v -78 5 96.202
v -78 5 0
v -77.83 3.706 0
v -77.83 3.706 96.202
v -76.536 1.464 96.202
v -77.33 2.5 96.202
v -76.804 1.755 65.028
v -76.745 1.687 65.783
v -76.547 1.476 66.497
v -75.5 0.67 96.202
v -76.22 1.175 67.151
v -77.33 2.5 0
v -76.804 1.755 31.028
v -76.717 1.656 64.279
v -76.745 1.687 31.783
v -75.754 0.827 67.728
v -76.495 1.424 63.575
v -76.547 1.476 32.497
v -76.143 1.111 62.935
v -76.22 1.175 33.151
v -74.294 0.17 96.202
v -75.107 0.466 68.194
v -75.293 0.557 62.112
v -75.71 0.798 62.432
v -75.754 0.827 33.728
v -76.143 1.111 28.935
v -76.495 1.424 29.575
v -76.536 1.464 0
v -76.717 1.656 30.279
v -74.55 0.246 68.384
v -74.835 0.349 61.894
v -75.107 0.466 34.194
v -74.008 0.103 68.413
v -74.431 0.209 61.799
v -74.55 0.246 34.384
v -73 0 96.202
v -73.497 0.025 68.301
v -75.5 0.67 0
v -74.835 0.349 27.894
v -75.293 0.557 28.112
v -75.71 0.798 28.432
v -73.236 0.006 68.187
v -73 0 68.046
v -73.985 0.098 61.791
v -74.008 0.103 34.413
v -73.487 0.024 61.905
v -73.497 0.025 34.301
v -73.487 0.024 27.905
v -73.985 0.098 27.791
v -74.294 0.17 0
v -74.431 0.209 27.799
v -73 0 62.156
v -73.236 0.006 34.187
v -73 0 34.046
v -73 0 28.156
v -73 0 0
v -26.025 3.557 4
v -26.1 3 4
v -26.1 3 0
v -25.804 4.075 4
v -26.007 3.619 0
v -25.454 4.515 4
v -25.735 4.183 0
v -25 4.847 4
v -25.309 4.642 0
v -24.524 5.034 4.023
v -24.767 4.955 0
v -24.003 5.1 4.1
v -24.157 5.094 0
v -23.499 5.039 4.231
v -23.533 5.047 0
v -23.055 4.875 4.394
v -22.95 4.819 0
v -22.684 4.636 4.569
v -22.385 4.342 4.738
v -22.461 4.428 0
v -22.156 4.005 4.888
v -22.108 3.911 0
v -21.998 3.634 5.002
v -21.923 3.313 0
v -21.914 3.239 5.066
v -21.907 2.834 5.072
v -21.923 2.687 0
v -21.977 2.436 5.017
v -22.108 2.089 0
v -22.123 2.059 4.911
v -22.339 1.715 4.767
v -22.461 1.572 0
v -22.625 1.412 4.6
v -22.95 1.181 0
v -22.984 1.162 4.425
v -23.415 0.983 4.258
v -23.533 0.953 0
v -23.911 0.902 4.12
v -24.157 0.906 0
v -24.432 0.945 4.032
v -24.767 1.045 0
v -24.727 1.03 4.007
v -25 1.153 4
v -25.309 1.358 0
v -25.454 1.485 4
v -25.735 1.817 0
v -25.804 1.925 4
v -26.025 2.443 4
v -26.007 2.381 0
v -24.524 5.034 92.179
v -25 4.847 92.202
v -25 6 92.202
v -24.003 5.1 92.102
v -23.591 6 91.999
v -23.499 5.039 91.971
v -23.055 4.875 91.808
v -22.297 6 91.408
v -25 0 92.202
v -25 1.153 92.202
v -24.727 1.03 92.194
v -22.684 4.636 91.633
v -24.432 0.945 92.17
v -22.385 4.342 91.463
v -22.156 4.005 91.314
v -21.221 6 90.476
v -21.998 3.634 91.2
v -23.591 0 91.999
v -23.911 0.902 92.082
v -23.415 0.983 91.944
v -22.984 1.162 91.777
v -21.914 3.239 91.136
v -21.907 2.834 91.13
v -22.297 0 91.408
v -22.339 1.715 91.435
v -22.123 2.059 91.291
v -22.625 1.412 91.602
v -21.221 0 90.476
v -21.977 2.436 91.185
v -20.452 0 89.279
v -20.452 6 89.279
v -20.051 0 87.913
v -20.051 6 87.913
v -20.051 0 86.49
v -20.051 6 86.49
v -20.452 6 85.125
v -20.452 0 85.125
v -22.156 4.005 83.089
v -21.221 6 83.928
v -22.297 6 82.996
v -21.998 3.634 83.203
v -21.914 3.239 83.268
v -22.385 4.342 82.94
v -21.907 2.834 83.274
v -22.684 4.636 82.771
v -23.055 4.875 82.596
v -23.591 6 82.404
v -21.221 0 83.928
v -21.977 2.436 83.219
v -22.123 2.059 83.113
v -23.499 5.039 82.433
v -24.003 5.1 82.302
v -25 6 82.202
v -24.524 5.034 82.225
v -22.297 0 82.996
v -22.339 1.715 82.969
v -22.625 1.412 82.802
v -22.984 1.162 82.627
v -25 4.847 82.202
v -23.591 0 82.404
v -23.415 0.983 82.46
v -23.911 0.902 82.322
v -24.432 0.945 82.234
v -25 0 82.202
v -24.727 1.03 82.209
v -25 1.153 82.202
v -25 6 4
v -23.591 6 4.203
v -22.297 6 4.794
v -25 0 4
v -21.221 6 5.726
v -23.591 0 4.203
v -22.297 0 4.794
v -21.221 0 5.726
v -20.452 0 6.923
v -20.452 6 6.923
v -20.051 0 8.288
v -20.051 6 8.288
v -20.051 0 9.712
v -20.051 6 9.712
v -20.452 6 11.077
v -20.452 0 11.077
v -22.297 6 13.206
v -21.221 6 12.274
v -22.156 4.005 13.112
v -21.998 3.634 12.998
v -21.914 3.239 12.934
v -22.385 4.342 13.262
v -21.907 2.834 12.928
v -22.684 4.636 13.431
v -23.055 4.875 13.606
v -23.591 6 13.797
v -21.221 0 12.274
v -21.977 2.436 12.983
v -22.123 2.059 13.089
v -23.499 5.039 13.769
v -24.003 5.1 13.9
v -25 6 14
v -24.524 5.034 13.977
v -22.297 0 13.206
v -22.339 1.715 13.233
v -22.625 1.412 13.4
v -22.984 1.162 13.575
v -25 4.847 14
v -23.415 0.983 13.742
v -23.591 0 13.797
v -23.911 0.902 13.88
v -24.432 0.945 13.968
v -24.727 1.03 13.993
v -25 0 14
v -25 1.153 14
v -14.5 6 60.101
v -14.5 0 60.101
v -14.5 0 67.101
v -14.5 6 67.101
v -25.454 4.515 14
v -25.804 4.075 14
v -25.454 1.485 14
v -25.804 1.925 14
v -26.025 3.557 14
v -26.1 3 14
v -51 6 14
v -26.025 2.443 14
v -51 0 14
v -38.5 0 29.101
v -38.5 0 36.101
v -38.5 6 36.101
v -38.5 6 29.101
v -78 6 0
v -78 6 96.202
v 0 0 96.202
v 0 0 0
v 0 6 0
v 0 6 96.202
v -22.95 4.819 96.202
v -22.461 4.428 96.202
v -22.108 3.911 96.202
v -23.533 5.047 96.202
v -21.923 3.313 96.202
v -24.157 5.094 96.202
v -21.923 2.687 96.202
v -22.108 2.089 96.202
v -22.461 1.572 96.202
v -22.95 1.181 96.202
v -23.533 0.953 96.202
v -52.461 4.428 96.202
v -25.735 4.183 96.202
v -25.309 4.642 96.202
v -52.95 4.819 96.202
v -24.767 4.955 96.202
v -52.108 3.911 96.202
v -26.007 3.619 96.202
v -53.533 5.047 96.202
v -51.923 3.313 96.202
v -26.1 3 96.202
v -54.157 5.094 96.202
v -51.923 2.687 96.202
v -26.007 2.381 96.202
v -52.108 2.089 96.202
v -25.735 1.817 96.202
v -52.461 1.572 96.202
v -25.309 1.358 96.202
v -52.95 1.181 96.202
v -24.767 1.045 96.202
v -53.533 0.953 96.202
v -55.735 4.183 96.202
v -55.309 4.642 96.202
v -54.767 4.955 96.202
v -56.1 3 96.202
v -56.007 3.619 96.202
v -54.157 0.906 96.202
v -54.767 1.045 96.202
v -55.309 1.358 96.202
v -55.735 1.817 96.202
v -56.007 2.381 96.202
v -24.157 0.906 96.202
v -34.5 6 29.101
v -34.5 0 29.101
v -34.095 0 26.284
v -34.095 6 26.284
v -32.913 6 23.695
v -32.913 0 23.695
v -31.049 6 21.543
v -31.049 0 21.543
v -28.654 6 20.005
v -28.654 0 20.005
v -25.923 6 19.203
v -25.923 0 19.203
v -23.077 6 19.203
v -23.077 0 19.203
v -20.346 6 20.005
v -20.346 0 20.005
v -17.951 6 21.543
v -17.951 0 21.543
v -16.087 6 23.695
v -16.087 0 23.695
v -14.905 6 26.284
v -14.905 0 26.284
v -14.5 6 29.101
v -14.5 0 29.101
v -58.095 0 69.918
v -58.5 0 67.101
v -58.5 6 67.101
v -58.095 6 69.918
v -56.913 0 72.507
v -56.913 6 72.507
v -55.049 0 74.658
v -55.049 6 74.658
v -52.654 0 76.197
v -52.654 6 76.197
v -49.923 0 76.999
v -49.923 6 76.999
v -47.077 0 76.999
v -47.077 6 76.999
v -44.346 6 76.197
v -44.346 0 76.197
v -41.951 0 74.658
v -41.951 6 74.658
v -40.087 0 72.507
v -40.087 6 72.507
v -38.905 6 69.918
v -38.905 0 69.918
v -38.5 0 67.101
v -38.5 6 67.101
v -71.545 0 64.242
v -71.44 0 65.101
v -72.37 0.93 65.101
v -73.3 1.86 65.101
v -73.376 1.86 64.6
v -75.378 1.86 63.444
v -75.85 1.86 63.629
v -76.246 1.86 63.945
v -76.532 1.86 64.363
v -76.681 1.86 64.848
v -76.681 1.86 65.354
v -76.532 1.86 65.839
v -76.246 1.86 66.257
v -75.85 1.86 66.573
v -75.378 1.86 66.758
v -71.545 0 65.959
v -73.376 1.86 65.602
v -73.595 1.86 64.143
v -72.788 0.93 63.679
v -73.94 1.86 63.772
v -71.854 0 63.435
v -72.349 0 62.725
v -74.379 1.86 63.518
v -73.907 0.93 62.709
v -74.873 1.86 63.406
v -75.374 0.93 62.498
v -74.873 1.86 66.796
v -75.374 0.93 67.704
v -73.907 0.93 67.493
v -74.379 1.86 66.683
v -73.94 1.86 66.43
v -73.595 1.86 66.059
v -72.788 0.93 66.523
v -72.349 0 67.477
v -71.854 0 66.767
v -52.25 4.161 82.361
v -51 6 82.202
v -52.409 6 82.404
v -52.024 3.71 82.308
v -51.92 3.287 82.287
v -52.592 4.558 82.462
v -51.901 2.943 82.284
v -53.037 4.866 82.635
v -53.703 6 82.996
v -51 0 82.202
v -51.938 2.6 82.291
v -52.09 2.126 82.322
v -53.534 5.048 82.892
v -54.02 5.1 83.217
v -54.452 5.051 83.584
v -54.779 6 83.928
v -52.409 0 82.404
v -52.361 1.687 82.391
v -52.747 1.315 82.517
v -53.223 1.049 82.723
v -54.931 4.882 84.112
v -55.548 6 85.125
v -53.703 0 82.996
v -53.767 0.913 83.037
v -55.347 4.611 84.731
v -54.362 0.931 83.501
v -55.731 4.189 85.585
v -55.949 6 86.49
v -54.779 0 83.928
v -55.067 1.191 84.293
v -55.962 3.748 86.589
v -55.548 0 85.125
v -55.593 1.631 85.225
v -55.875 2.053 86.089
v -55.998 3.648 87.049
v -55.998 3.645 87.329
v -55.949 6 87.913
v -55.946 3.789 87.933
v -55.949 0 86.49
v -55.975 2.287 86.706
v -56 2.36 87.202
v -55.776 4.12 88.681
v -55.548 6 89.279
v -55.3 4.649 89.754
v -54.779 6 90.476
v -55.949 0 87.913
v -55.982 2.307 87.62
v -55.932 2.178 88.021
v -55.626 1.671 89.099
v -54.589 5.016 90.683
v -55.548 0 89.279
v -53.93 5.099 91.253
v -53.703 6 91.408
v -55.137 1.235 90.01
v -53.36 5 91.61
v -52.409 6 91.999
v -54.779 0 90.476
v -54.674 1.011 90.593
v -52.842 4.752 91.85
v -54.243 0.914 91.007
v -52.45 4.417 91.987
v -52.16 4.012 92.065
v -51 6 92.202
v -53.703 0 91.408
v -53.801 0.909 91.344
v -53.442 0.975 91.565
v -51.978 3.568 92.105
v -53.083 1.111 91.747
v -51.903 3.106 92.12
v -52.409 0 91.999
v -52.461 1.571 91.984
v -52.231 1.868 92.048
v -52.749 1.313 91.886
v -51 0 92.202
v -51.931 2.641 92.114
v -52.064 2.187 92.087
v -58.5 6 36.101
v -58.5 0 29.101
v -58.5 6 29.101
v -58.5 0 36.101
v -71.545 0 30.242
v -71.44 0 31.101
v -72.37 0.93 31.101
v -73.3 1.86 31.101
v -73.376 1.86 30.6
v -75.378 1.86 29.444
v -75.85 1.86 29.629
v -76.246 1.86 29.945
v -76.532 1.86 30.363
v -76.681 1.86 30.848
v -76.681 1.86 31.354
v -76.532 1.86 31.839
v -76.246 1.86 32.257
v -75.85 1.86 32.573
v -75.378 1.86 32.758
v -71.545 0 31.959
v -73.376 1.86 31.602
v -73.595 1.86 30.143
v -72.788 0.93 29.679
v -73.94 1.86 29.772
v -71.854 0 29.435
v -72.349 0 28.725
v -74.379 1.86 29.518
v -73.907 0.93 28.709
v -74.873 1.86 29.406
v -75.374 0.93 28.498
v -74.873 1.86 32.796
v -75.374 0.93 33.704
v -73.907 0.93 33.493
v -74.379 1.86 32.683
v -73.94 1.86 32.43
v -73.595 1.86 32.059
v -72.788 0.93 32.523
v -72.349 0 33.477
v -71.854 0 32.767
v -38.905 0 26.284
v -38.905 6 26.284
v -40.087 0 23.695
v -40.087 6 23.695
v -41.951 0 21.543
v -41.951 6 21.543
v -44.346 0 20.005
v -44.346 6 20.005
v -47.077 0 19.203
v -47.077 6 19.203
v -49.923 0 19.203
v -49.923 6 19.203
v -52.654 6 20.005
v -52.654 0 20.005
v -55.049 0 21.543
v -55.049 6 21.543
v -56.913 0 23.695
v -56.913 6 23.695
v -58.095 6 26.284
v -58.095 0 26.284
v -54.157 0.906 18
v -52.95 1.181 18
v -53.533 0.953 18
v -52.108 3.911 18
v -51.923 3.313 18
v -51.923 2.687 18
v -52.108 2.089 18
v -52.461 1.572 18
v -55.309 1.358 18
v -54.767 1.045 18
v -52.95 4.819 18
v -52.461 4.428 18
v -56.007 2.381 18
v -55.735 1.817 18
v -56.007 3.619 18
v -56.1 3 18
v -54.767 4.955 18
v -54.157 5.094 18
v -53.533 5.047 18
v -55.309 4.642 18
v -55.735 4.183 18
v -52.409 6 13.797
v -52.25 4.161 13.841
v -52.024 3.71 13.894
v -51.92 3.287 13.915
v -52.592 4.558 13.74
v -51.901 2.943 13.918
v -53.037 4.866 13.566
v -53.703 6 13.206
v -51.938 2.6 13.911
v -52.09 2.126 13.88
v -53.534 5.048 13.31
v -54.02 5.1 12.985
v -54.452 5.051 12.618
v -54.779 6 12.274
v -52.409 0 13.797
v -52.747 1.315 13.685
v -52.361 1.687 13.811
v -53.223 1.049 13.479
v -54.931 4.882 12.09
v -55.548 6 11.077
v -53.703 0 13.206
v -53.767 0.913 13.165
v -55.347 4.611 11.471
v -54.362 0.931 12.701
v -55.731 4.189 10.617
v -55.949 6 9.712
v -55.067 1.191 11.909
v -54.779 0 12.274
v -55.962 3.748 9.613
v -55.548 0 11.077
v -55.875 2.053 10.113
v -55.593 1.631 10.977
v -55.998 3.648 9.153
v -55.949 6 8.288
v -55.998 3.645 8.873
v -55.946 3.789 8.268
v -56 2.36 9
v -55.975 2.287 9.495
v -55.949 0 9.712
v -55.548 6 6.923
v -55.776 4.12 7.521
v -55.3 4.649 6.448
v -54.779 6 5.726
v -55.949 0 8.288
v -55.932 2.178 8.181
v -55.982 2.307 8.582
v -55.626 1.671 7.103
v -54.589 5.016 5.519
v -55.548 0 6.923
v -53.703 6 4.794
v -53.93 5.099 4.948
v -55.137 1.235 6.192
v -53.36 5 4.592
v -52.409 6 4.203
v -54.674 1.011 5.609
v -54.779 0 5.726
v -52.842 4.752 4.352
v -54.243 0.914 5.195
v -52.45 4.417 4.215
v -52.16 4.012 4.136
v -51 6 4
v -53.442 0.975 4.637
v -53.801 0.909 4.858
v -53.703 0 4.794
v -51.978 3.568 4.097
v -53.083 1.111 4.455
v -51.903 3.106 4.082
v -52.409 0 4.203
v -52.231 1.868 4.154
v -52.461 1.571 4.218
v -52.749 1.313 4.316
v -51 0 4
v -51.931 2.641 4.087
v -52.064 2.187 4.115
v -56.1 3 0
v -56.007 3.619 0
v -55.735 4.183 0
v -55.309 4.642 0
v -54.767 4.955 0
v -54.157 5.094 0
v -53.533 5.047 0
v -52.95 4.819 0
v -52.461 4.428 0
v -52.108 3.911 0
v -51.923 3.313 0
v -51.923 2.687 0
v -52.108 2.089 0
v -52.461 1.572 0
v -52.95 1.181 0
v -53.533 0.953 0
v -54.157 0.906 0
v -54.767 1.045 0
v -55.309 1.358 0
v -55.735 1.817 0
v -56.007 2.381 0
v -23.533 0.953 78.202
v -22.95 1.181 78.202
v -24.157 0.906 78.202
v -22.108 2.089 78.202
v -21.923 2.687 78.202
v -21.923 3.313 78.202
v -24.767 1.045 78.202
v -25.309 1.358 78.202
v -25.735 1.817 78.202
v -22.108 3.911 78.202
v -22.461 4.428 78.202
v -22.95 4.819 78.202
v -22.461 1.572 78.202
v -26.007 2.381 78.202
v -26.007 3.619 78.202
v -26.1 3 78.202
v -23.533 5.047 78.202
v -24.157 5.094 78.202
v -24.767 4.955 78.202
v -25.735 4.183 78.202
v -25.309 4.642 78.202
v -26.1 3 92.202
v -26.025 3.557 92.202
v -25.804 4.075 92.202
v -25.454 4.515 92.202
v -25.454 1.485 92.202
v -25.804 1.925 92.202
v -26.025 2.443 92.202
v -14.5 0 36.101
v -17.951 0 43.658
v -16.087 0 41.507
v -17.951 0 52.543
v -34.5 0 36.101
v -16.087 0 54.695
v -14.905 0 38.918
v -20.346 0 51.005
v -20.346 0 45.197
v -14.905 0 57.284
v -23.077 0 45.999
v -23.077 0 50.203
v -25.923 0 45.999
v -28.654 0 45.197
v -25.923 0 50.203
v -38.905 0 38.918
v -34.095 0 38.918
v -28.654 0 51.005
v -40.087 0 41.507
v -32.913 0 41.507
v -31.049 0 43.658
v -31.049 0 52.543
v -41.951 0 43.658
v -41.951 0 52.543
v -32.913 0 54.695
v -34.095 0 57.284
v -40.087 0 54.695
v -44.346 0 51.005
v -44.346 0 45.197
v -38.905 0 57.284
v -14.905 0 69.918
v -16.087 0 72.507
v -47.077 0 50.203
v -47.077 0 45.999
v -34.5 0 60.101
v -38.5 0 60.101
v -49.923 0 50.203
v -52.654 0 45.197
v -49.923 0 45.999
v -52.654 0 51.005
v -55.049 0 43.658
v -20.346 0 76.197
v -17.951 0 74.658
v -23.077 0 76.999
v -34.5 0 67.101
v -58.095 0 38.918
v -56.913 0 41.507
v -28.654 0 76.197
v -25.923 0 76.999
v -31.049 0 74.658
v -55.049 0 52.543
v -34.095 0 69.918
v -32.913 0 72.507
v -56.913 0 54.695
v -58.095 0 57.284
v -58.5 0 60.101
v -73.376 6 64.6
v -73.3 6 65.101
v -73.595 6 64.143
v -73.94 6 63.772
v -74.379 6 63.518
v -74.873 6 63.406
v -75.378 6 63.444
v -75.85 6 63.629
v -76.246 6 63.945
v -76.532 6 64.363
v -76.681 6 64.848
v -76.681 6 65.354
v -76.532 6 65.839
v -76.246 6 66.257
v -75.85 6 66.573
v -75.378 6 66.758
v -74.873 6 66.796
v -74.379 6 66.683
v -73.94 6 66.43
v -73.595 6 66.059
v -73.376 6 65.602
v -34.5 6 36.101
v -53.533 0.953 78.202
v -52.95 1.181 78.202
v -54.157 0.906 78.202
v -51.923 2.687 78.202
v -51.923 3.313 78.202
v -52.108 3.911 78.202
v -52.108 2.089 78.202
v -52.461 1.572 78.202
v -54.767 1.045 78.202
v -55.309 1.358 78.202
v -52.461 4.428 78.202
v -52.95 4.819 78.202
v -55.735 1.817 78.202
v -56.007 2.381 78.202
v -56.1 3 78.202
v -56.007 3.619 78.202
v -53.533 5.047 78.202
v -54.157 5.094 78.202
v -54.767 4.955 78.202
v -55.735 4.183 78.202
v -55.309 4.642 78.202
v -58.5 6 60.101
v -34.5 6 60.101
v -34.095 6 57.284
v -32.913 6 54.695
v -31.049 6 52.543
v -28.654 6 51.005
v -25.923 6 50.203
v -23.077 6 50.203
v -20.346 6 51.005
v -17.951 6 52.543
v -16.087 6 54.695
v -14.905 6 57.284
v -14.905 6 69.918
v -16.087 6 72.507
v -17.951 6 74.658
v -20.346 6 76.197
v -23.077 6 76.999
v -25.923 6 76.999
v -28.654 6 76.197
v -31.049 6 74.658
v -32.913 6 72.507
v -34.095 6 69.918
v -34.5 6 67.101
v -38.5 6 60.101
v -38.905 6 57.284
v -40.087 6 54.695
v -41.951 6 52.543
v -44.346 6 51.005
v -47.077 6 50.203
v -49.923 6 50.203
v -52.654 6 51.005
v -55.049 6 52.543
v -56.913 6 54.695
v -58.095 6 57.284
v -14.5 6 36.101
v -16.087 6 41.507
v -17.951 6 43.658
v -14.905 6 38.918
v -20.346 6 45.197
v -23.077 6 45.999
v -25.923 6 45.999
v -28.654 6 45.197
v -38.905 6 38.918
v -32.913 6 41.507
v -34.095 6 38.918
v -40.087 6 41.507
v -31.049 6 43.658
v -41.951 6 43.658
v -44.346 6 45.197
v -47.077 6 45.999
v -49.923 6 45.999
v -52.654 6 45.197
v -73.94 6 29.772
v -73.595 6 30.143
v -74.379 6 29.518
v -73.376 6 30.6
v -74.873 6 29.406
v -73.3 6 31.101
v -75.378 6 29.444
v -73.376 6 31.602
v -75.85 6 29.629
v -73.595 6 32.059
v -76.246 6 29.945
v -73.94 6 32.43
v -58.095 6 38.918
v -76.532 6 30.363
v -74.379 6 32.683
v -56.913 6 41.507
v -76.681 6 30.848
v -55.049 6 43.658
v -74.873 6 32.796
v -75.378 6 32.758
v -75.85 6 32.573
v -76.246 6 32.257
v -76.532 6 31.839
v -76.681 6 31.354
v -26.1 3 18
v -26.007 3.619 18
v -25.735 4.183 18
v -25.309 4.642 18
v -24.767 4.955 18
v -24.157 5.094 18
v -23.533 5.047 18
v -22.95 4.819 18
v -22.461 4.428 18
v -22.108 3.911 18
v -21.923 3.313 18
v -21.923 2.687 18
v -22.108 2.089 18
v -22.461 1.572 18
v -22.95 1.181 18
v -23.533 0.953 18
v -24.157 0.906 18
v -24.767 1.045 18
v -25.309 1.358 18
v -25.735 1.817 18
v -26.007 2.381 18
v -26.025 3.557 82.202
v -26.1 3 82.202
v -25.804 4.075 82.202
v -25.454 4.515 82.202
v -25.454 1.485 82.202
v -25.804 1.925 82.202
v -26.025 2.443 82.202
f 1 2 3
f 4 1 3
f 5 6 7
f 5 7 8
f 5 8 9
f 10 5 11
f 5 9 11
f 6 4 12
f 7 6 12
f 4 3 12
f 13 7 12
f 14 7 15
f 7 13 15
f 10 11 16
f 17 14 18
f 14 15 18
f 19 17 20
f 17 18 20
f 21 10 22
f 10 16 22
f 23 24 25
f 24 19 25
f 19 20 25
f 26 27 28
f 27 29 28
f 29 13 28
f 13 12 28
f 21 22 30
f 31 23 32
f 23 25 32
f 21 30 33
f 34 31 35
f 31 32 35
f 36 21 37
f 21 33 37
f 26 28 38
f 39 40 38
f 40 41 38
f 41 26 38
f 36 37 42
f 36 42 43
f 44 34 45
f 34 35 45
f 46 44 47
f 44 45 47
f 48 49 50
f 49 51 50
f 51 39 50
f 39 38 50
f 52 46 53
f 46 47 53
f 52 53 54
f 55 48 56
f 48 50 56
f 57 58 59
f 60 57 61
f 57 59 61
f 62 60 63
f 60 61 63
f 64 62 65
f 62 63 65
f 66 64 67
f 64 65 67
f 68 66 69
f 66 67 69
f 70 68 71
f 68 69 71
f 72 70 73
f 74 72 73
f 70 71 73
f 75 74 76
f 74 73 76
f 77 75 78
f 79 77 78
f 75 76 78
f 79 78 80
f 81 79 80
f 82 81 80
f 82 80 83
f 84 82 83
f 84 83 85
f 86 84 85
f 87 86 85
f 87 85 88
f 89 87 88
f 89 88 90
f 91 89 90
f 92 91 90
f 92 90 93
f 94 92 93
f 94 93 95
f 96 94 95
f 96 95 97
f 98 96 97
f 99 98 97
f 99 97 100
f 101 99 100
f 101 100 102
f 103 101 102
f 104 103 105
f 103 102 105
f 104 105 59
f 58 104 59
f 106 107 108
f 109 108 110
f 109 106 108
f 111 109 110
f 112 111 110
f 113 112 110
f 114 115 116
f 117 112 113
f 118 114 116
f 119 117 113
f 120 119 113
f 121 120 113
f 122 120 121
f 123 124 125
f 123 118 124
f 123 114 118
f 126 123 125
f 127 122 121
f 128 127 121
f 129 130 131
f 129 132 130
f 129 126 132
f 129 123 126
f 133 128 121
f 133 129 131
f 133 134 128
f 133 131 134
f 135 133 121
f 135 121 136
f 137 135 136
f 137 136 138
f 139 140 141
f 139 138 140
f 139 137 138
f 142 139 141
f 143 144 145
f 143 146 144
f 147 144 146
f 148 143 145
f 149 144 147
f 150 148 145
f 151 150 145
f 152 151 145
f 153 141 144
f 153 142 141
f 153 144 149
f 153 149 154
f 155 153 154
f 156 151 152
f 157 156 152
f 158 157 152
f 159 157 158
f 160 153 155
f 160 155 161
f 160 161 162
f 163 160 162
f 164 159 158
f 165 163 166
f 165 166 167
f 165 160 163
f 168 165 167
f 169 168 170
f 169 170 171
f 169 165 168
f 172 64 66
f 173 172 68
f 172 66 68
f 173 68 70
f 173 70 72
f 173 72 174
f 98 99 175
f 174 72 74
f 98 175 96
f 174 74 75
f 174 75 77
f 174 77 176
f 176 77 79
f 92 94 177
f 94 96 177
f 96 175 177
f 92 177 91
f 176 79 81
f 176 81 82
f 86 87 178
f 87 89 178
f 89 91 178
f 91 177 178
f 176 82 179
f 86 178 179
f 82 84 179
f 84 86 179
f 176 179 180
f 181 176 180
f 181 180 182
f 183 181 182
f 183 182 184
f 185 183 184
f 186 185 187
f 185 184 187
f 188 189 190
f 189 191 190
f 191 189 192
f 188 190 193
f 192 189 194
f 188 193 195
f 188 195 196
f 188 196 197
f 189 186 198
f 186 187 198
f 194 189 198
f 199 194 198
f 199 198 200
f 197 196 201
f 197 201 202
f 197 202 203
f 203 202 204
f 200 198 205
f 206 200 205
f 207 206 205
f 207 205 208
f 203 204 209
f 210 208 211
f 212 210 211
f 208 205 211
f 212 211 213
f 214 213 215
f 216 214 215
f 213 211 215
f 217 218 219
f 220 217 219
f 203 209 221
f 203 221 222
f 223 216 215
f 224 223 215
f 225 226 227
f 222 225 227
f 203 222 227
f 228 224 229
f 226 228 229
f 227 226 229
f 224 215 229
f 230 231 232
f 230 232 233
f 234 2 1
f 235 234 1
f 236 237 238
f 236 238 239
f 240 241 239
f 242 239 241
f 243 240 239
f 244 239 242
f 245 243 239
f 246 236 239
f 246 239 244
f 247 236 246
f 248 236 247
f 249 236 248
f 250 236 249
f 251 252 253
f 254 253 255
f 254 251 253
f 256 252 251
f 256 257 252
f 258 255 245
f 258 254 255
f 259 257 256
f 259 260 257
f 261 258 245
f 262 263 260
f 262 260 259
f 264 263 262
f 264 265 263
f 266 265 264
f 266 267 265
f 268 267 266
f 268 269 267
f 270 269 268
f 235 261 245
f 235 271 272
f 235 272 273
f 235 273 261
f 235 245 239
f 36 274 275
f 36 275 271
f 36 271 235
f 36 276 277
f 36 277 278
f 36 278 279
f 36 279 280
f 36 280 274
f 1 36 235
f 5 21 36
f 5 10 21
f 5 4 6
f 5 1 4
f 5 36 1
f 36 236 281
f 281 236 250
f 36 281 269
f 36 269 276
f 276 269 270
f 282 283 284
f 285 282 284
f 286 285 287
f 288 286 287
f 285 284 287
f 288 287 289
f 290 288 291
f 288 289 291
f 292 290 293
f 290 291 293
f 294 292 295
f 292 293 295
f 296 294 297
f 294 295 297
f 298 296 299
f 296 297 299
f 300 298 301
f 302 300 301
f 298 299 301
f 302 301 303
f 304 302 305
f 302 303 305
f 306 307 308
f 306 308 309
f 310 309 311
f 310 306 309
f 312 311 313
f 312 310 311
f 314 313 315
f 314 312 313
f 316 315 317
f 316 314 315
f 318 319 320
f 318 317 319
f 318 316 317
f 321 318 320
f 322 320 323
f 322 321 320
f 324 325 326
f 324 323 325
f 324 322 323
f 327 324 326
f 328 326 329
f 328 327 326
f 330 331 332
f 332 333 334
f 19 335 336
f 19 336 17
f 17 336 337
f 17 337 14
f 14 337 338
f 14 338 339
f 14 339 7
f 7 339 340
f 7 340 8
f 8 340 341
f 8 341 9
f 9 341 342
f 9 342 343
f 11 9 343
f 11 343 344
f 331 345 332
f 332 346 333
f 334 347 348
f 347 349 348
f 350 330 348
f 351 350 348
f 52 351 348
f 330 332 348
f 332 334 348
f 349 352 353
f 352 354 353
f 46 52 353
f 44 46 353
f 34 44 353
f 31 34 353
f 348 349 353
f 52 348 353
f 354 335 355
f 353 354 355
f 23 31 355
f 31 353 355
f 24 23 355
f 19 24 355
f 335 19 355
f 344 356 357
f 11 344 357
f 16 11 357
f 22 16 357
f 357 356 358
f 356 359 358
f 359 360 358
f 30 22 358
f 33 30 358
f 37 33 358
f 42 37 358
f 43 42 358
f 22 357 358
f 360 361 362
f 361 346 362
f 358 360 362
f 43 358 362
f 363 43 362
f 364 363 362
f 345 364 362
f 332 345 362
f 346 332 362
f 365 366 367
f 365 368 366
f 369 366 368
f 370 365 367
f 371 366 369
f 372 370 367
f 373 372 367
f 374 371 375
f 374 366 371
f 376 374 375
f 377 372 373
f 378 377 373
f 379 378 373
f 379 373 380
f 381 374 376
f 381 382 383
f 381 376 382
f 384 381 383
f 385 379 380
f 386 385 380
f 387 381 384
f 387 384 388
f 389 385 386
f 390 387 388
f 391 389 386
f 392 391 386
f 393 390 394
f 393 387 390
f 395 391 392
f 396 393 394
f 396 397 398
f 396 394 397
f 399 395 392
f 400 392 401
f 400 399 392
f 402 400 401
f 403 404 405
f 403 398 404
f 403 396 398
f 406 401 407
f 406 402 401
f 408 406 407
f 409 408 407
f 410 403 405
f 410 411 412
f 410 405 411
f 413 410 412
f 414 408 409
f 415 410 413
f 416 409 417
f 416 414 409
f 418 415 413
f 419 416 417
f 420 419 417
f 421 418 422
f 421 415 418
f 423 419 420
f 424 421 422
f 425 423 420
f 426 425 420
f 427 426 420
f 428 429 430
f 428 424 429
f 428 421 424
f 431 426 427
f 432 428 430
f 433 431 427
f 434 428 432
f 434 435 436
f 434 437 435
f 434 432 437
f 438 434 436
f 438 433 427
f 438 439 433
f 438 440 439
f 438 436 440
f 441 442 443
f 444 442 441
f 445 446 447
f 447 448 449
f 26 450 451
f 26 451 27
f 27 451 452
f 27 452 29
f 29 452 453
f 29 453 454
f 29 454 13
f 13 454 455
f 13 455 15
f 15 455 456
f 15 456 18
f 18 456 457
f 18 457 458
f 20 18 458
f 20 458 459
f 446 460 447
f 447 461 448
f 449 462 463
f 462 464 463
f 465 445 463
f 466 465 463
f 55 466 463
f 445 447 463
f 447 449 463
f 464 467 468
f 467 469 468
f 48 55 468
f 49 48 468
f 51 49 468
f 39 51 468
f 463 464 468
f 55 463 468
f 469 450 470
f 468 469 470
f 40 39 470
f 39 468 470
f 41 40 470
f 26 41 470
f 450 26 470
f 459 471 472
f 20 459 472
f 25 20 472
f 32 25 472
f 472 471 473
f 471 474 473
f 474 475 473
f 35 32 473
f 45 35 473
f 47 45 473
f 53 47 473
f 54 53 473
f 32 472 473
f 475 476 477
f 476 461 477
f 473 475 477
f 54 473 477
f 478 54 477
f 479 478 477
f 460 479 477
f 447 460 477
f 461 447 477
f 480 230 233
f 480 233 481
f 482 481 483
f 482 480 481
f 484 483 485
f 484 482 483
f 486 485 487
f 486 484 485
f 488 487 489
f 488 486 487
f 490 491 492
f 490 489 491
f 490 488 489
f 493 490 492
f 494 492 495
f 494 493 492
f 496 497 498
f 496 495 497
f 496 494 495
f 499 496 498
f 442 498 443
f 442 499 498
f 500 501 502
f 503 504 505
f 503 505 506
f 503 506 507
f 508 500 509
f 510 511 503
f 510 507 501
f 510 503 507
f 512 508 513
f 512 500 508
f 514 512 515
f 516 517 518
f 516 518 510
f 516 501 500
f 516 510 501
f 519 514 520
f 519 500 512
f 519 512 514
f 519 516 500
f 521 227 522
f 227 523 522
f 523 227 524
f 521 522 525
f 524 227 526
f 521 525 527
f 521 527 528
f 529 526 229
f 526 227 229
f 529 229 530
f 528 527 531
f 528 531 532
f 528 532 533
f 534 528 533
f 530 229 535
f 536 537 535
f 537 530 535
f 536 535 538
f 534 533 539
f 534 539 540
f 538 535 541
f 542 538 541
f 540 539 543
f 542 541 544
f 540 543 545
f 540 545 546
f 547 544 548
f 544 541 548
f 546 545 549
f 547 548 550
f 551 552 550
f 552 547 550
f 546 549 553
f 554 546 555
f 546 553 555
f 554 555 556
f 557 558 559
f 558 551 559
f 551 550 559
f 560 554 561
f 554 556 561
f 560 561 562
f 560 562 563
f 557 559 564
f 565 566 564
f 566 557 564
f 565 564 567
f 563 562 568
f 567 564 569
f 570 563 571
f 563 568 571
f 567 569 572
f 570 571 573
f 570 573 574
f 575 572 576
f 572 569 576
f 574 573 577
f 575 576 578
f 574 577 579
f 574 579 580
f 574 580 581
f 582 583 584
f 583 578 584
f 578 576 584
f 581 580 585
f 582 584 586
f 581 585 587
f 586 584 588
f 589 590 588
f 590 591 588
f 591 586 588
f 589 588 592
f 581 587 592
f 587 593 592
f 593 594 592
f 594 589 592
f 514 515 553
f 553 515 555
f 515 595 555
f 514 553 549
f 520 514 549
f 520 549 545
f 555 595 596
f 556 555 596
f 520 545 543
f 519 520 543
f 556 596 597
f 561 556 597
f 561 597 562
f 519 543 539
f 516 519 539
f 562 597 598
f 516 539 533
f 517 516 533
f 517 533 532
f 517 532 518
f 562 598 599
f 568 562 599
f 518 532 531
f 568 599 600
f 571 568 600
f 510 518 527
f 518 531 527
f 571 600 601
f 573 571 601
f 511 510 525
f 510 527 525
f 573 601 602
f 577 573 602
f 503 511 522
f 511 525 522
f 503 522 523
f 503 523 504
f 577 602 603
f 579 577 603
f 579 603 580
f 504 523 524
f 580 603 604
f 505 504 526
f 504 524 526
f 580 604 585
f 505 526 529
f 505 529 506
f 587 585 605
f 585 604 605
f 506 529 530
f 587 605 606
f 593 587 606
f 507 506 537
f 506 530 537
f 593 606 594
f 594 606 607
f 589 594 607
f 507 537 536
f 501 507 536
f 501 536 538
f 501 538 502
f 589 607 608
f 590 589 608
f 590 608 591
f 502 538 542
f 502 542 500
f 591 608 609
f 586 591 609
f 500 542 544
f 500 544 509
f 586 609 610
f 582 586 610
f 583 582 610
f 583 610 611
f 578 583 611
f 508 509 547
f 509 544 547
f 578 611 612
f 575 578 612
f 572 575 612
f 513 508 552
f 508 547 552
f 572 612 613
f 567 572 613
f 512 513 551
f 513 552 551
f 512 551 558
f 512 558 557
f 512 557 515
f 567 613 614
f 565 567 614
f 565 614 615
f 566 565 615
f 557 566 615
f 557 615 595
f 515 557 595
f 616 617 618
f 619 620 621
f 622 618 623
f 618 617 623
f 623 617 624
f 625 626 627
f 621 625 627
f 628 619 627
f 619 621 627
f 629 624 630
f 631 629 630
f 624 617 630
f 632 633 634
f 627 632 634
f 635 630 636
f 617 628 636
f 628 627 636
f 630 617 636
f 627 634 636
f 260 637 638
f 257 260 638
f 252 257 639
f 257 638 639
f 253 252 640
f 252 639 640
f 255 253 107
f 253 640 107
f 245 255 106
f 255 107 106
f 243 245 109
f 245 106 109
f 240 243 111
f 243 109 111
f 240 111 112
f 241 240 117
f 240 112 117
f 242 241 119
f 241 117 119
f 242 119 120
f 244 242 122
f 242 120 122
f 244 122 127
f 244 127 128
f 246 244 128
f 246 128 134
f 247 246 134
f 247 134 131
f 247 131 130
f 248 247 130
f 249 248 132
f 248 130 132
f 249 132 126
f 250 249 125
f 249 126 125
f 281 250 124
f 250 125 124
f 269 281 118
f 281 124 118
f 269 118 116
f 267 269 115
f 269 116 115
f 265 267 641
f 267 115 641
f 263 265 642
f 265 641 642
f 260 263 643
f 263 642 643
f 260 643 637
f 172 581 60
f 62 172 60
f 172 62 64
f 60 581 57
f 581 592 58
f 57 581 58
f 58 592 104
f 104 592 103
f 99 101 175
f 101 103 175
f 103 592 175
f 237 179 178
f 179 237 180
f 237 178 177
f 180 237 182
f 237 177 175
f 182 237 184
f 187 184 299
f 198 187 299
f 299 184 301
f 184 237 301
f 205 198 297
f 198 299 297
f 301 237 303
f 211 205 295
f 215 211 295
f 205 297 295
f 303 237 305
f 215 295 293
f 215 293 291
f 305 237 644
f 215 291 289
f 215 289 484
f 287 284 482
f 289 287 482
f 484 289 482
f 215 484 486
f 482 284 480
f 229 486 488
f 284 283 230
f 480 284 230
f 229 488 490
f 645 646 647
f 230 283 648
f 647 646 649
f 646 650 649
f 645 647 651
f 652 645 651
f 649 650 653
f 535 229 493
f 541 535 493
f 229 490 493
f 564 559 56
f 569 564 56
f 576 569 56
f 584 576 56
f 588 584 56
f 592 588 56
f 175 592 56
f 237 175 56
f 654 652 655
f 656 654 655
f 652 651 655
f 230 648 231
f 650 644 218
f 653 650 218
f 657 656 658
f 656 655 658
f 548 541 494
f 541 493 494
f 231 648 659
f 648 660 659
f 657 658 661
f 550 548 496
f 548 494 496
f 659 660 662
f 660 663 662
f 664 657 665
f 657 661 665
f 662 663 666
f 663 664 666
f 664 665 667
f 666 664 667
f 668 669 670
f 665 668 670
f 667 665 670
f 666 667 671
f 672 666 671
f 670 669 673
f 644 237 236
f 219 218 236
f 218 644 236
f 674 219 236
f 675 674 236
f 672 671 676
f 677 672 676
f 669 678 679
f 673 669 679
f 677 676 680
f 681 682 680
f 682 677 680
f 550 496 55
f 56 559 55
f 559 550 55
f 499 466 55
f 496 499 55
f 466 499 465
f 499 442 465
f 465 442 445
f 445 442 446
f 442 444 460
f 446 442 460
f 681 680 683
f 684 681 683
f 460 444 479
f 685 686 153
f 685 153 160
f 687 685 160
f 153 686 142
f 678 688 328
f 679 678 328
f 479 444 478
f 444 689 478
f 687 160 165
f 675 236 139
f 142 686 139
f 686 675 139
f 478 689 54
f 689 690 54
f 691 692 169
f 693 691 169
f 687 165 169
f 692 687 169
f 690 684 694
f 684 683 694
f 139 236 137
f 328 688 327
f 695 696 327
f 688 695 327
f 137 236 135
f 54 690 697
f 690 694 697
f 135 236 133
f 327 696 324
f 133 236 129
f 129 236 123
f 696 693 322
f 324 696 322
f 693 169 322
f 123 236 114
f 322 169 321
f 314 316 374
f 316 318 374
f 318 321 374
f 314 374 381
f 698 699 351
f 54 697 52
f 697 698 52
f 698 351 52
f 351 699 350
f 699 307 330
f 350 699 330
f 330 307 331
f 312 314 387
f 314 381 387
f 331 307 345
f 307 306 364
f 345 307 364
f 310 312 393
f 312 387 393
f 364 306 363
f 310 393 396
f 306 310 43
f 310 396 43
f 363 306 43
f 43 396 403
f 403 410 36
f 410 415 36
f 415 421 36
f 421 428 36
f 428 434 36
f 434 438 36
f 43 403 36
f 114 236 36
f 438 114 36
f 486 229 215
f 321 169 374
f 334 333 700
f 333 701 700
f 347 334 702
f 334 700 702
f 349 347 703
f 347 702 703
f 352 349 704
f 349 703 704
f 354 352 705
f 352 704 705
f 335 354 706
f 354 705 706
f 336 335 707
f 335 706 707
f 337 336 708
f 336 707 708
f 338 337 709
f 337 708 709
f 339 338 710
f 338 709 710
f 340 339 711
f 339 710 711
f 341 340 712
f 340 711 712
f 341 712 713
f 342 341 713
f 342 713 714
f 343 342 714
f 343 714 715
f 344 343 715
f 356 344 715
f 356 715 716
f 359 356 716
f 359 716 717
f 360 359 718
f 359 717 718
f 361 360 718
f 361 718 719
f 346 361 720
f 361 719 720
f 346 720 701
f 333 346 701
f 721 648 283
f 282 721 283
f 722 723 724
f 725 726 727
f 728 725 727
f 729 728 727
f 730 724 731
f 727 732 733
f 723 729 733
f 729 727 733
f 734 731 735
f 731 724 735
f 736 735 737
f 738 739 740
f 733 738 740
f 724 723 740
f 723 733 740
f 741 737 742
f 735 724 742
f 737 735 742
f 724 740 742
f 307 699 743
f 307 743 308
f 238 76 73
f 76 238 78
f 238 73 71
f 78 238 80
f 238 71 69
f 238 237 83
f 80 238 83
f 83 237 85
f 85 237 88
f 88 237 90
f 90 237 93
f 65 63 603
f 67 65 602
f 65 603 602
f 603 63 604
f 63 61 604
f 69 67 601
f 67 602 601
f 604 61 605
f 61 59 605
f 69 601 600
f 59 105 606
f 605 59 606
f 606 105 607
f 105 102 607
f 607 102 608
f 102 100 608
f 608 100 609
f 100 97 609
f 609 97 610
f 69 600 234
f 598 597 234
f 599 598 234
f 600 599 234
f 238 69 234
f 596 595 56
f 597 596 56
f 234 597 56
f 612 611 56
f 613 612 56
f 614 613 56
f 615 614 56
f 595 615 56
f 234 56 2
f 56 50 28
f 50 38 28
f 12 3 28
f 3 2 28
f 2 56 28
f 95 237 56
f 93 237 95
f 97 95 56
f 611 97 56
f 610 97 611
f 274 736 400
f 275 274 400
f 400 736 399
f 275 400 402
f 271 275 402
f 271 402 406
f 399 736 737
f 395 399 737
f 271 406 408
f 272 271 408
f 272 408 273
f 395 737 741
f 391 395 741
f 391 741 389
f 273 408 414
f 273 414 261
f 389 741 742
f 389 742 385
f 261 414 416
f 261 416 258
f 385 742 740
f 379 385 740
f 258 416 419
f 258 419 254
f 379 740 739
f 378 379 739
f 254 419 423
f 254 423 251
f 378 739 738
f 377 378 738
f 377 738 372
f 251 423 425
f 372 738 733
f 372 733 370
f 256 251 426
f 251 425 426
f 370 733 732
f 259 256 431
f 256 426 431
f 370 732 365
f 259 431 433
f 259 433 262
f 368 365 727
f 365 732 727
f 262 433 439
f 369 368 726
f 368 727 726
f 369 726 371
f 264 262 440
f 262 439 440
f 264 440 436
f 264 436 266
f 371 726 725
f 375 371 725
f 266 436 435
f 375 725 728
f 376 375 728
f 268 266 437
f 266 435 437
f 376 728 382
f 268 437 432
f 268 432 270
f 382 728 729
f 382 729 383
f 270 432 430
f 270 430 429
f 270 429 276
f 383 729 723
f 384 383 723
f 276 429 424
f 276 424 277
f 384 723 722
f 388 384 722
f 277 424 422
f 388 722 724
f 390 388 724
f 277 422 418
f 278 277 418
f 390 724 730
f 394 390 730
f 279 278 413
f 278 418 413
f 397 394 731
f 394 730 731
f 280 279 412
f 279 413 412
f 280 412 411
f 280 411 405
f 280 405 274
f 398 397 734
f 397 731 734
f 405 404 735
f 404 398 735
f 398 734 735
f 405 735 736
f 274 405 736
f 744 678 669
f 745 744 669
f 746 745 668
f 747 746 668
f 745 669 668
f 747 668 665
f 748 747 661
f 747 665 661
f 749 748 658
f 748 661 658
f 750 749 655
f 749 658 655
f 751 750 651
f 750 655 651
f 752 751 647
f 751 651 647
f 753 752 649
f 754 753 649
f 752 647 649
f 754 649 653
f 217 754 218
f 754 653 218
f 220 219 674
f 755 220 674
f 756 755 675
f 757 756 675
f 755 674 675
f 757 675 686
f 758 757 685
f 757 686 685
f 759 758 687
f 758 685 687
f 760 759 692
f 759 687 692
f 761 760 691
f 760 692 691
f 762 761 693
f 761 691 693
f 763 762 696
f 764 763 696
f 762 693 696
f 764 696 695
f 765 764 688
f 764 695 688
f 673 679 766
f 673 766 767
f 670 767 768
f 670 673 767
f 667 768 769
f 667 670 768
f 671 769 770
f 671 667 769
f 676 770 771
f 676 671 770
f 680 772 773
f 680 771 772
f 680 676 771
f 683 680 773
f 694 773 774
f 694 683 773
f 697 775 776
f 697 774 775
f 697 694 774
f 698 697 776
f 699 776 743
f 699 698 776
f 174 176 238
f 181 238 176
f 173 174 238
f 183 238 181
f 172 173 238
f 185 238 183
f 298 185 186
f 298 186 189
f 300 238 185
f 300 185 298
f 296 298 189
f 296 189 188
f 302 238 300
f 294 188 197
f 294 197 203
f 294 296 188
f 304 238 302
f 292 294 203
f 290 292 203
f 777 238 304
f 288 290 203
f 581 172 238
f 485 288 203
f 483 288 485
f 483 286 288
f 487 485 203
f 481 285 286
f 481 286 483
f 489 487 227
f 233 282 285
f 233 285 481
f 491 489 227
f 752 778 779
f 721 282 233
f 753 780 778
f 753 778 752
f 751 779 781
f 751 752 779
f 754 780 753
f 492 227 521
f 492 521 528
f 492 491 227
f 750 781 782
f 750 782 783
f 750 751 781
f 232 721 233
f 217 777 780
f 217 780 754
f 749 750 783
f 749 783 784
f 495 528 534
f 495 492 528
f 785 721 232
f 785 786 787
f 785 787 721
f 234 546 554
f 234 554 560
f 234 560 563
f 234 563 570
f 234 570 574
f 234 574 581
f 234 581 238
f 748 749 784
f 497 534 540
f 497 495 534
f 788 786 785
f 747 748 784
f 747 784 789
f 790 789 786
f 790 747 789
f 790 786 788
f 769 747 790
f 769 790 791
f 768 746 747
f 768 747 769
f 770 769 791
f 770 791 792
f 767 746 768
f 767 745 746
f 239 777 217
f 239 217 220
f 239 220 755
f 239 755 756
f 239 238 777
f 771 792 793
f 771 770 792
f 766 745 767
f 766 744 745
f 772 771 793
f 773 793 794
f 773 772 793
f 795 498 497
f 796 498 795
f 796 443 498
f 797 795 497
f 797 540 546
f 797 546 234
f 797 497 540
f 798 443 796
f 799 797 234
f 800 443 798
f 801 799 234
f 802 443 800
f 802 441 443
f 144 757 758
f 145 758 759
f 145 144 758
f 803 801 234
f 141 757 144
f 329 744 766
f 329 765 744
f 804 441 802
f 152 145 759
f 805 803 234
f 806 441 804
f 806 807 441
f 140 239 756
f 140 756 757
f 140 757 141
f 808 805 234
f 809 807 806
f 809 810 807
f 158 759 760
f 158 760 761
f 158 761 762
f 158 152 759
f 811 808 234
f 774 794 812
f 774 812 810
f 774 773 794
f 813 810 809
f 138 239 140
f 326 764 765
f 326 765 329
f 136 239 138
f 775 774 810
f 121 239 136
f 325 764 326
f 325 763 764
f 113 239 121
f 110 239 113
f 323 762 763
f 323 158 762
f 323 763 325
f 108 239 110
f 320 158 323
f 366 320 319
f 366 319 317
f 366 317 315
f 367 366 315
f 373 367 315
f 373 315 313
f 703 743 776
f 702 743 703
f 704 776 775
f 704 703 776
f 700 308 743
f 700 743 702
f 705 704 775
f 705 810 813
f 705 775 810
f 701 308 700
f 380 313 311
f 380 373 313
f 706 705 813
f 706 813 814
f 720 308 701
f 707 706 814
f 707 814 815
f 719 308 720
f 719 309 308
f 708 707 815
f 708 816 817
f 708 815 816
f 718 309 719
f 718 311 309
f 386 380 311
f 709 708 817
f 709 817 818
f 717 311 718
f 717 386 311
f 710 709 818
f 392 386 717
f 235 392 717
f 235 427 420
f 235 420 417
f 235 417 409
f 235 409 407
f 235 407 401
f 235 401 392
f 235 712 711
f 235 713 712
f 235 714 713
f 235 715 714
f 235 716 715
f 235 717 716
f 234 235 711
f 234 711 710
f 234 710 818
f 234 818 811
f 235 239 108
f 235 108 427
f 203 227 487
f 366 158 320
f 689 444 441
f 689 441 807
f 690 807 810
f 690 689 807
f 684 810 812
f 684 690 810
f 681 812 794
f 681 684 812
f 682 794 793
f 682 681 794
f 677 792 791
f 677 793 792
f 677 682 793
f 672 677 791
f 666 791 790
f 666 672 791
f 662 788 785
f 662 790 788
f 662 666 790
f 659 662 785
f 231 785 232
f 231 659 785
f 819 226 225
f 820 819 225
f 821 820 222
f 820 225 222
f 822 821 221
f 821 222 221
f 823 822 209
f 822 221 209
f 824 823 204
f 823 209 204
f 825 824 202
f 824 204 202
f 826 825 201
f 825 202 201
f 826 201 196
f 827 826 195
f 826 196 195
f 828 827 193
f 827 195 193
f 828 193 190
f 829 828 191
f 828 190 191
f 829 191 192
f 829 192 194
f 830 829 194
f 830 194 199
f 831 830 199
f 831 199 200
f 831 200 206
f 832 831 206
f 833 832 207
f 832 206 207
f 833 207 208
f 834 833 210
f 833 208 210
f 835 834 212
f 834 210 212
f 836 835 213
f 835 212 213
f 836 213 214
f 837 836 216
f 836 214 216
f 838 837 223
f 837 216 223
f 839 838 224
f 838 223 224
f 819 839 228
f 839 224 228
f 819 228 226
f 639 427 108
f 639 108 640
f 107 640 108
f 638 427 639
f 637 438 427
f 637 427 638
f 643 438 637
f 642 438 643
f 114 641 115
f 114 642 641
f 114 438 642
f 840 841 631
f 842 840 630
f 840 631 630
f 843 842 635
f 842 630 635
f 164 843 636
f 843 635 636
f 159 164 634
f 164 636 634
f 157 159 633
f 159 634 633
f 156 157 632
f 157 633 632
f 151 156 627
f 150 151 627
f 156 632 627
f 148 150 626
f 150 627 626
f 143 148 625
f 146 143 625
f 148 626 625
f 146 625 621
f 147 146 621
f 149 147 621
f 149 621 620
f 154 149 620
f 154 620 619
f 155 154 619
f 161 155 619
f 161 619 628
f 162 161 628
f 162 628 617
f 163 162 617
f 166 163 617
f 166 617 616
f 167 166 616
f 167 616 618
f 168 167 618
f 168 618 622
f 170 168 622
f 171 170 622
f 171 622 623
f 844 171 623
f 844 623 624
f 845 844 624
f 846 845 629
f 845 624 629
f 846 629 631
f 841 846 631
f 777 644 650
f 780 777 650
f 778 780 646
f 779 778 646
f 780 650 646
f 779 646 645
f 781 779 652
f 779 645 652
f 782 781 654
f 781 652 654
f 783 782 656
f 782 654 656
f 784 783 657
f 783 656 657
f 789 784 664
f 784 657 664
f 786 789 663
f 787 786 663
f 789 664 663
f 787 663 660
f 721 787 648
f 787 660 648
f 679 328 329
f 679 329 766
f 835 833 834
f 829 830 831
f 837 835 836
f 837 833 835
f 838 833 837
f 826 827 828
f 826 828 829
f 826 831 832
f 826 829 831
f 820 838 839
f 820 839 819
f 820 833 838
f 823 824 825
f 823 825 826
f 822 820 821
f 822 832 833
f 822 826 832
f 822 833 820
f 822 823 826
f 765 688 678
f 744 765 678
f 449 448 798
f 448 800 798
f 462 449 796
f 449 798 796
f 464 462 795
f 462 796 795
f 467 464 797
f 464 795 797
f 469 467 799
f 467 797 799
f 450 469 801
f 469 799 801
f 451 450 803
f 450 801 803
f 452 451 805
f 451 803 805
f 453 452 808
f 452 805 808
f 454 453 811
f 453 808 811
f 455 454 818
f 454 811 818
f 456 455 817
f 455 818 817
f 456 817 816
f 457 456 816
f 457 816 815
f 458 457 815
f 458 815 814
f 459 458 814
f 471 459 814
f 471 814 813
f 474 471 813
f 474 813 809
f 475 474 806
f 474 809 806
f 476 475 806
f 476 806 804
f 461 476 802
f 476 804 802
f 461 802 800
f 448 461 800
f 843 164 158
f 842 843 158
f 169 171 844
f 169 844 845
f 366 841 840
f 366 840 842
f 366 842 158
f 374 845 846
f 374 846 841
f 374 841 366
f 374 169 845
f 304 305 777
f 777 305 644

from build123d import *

# Parameters (mm, degrees)
SKETCH1_W                     = 78
SKETCH1_H                     = 96.2019
BOSS_EXTRUDE1_DEPTH           = 6
SKETCH2_R                     = 1.5
CUT_EXTRUDE2_DEPTH            = 124.995183631
SKETCH3_R                     = 2.1
CUT_EXTRUDE3_DEPTH            = 18
CUT_EXTRUDE4_START            = -78.2019
SKETCH3_2_R                   = 2.1
CUT_EXTRUDE4_DEPTH            = 18
FILLET1_R                     = 5
CUT_EXTRUDE5_DEPTH            = 10
CSK_FOR_M3_SFHCS2_D           = 3.4
CSK_FOR_M3_SFHCS2_CSINK_D     = 7.12
CSK_FOR_M3_SFHCS2_CSINK_ANGLE = 90


with BuildPart() as part:
    # Sketch1 → Boss-Extrude1 (new body)
    with BuildSketch(Plane(origin=(0, 0, 0), x_dir=(-1, 0, 0), z_dir=(0, 1, 0))):
        with Locations((39, 48.10095)):
            Rectangle(SKETCH1_W, SKETCH1_H)
    extrude(amount=BOSS_EXTRUDE1_DEPTH)

    # Sketch2 → Cut-Extrude2 (cut, through all)
    with BuildSketch(Plane(origin=(0, 0, 0), x_dir=(-1, 0, 0), z_dir=(0, -1, 0))):
        with Locations(Location((75, -31.10095, 0), (0, 0, 90))):
            Circle(SKETCH2_R)
        with Locations(Location((75, -65.10095, 0), (0, 0, 90))):
            Circle(SKETCH2_R)
    extrude(amount=-CUT_EXTRUDE2_DEPTH, mode=Mode.SUBTRACT)

    # Sketch3 → Cut-Extrude3 (cut)
    with BuildSketch(Plane(origin=(0, 0, 0), x_dir=(1, 0, 0), z_dir=(0, 0, -1))):
        with Locations(Location((-54, -3, 0), (0, 0, 180))):
            Circle(SKETCH3_R)
        with Locations(Location((-24, -3, 0), (0, 0, 180))):
            Circle(SKETCH3_R)
    extrude(amount=-CUT_EXTRUDE3_DEPTH, mode=Mode.SUBTRACT)

    # Sketch3<2> → Cut-Extrude4 (cut)
    with BuildSketch(Plane(origin=(0, 0, 0), x_dir=(1, 0, 0), z_dir=(0, 0, -1)).offset(CUT_EXTRUDE4_START)):
        with Locations(Location((-54, -3, 0), (0, 0, 180))):
            Circle(SKETCH3_2_R)
        with Locations(Location((-24, -3, 0), (0, 0, 180))):
            Circle(SKETCH3_2_R)
    extrude(amount=-CUT_EXTRUDE4_DEPTH, mode=Mode.SUBTRACT)

    # Fillet1
    # the kernel refuses this fillet: 5 mm, written as the material it takes off along each edge
    with BuildSketch(Plane(origin=(-78, 0, -12.5), x_dir=(1, 0, 0), z_dir=(0, 0, 1))) as fillet1_piece_1:
        with BuildLine():
            CenterArc((FILLET1_R, FILLET1_R), FILLET1_R, 180, 90)
            Line((0, FILLET1_R), (0, 0))
            Line((0, 0), (FILLET1_R, 0))
        make_face()
    extrude(amount=121.2019, mode=Mode.SUBTRACT)

    # Sketch4 → Cut-Extrude5 (cut)
    with BuildSketch(Plane.XZ):
        with BuildLine():
            Line((-51, 92.2019), (-25, 92.2019))
            ThreePointArc((-25, 92.2019), (-20, 87.2019), (-25, 82.2019))
            Line((-25, 82.2019), (-51, 82.2019))
            ThreePointArc((-51, 82.2019), (-56, 87.2019), (-51, 92.2019))
        make_face()
        with BuildLine():
            Line((-58.5, 29.10095), (-58.5, 36.10095))
            ThreePointArc((-58.5, 36.10095), (-48.5, 46.10095), (-38.5, 36.10095))
            Line((-38.5, 36.10095), (-38.5, 29.10095))
            ThreePointArc((-38.5, 29.10095), (-48.5, 19.10095), (-58.5, 29.10095))
        make_face()
        with BuildLine():
            Line((-38.5, 67.10095), (-38.5, 60.10095))
            ThreePointArc((-38.5, 60.10095), (-48.5, 50.10095), (-58.5, 60.10095))
            Line((-58.5, 60.10095), (-58.5, 67.10095))
            ThreePointArc((-58.5, 67.10095), (-48.5, 77.10095), (-38.5, 67.10095))
        make_face()
        with BuildLine():
            Line((-14.5, 29.10095), (-14.5, 36.10095))
            ThreePointArc((-14.5, 36.10095), (-24.5, 46.10095), (-34.5, 36.10095))
            Line((-34.5, 36.10095), (-34.5, 29.10095))
            ThreePointArc((-34.5, 29.10095), (-24.5, 19.10095), (-14.5, 29.10095))
        make_face()
        with BuildLine():
            Line((-34.5, 67.10095), (-34.5, 60.10095))
            ThreePointArc((-34.5, 60.10095), (-24.5, 50.10095), (-14.5, 60.10095))
            Line((-14.5, 60.10095), (-14.5, 67.10095))
            ThreePointArc((-14.5, 67.10095), (-24.5, 77.10095), (-34.5, 67.10095))
        make_face()
        with BuildLine():
            Line((-51, 4), (-25, 4))
            ThreePointArc((-25, 4), (-20, 9), (-25, 14))
            Line((-25, 14), (-51, 14))
            ThreePointArc((-51, 14), (-56, 9), (-51, 4))
        make_face()
    extrude(amount=-CUT_EXTRUDE5_DEPTH, mode=Mode.SUBTRACT)

    # CSK for M3 SFHCS2 (through all)
    with Locations(Plane(origin=(0, 0, 0), x_dir=(-1, 0, 0), z_dir=(0, -1, 0))):
        with Locations((75, -31.10095), (75, -65.10095)):
            CounterSinkHole(CSK_FOR_M3_SFHCS2_D / 2, CSK_FOR_M3_SFHCS2_CSINK_D / 2, counter_sink_angle=CSK_FOR_M3_SFHCS2_CSINK_ANGLE)


solid = part.part
